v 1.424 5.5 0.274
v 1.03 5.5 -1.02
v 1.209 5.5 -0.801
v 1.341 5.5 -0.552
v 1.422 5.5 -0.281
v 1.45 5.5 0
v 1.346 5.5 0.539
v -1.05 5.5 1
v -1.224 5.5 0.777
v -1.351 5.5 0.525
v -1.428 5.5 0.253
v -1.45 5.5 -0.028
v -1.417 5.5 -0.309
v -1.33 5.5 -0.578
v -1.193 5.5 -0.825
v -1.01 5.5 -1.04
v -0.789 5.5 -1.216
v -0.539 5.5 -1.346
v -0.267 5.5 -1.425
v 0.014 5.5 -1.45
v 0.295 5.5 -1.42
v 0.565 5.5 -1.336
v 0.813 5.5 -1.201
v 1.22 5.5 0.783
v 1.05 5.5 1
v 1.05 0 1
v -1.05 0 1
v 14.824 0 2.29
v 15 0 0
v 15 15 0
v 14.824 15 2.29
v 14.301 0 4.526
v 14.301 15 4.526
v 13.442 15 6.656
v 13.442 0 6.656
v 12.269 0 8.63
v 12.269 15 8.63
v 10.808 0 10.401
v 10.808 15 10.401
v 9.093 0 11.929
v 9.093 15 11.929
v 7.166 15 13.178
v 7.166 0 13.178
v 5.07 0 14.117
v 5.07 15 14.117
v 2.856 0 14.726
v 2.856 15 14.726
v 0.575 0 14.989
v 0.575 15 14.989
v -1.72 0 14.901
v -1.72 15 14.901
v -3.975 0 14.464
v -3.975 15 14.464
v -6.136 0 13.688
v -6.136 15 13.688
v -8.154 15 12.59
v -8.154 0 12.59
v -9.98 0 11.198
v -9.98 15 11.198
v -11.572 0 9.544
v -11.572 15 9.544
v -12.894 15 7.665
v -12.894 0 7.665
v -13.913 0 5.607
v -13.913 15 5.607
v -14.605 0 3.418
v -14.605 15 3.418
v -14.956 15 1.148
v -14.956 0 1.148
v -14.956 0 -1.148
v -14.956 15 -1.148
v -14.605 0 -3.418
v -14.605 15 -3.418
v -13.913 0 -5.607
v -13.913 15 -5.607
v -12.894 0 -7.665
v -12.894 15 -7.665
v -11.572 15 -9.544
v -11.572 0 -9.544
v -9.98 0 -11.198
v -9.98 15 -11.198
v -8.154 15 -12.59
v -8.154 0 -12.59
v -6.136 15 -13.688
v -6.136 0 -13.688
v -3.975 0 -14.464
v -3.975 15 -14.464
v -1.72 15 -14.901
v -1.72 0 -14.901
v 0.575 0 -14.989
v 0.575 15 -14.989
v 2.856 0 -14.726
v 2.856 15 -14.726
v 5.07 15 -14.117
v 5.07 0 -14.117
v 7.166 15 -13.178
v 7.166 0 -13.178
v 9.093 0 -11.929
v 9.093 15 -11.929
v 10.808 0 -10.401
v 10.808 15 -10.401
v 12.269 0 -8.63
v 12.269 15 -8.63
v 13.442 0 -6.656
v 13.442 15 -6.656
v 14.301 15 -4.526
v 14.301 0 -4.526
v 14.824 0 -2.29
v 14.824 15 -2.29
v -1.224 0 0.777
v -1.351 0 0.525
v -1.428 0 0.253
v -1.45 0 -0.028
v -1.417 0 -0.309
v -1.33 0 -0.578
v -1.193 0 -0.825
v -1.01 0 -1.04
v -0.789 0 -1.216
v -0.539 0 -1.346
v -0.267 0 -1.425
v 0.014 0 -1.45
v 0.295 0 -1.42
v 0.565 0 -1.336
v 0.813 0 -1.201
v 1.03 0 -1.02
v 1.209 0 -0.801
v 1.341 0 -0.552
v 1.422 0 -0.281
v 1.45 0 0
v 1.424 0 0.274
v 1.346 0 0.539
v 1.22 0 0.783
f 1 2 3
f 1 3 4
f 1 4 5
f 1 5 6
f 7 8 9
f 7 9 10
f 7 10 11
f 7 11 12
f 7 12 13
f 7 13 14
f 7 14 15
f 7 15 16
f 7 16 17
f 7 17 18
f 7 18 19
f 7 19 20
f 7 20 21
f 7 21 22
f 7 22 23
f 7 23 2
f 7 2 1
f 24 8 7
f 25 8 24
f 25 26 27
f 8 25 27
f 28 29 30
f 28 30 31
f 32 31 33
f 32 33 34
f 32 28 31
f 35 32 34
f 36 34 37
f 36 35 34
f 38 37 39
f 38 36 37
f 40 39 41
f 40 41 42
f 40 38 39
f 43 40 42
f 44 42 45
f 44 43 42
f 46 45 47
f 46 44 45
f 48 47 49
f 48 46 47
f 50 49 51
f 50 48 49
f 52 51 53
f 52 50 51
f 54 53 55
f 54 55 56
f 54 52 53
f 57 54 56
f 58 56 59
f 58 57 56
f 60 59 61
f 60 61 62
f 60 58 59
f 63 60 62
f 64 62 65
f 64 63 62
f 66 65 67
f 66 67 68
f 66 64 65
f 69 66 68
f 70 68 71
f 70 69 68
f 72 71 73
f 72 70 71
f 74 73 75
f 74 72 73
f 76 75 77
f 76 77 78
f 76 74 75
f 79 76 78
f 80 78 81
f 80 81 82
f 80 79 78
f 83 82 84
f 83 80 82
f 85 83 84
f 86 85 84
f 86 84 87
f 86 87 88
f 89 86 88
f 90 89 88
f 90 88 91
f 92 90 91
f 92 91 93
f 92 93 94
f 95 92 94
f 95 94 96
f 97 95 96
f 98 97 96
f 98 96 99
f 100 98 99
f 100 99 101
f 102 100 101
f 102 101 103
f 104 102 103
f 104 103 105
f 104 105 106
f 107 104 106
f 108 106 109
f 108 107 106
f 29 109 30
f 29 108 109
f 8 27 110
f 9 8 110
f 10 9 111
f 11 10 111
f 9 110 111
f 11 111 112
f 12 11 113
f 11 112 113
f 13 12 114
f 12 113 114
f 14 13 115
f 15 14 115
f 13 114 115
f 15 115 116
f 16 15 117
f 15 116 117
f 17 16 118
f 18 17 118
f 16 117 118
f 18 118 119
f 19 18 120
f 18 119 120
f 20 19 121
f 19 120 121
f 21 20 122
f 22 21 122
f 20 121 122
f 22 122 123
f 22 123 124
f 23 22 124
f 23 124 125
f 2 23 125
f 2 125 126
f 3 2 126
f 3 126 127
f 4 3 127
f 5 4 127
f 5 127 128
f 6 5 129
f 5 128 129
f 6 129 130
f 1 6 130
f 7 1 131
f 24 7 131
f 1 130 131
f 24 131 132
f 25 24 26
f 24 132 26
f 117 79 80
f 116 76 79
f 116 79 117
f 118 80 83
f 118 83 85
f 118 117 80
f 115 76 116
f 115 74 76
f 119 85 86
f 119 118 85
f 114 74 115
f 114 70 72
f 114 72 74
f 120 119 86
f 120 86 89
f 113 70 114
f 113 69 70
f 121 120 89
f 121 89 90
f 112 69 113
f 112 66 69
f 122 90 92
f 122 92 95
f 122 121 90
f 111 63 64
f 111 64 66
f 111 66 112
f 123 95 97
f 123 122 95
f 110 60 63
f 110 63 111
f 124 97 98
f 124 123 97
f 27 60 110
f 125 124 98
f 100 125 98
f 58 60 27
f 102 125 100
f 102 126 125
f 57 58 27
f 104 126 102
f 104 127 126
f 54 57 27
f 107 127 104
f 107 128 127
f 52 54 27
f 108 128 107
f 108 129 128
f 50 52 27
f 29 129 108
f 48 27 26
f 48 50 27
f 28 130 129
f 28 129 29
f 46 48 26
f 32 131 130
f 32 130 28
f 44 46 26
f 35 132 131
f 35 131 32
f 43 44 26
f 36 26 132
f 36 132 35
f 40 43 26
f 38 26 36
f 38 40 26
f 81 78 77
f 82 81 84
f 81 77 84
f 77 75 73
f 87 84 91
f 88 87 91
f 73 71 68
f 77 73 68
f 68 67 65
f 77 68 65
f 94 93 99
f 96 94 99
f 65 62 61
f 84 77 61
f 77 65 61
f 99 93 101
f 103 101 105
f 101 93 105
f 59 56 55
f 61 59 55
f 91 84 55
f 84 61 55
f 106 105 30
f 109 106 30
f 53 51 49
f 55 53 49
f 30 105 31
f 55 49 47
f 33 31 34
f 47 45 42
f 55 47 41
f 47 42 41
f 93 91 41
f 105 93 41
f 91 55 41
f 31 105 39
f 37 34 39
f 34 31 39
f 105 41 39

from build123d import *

# Parameters (mm, degrees)
F0_R     = 15
F1_DEPTH = 15
F3_DEPTH = 5.5


with BuildPart() as f1:
    # F0 (on Front) → F1 (new body)
    with BuildSketch(Plane.XZ):
        Circle(F0_R)
    extrude(amount=-F1_DEPTH)

    # F2 (on face) → F3 (cut)
    with BuildSketch(Plane.XZ):
        with BuildLine():
            ThreePointArc((-1.05, 1), (-0.538516, -1.346291), (1.45, 0))
            ThreePointArc((1.45, 0), (1.346291, 0.538516), (1.05, 1))
            Line((1.05, 1), (-1.05, 1))
        make_face()
    extrude(amount=-F3_DEPTH, mode=Mode.SUBTRACT)


solid = f1.part
